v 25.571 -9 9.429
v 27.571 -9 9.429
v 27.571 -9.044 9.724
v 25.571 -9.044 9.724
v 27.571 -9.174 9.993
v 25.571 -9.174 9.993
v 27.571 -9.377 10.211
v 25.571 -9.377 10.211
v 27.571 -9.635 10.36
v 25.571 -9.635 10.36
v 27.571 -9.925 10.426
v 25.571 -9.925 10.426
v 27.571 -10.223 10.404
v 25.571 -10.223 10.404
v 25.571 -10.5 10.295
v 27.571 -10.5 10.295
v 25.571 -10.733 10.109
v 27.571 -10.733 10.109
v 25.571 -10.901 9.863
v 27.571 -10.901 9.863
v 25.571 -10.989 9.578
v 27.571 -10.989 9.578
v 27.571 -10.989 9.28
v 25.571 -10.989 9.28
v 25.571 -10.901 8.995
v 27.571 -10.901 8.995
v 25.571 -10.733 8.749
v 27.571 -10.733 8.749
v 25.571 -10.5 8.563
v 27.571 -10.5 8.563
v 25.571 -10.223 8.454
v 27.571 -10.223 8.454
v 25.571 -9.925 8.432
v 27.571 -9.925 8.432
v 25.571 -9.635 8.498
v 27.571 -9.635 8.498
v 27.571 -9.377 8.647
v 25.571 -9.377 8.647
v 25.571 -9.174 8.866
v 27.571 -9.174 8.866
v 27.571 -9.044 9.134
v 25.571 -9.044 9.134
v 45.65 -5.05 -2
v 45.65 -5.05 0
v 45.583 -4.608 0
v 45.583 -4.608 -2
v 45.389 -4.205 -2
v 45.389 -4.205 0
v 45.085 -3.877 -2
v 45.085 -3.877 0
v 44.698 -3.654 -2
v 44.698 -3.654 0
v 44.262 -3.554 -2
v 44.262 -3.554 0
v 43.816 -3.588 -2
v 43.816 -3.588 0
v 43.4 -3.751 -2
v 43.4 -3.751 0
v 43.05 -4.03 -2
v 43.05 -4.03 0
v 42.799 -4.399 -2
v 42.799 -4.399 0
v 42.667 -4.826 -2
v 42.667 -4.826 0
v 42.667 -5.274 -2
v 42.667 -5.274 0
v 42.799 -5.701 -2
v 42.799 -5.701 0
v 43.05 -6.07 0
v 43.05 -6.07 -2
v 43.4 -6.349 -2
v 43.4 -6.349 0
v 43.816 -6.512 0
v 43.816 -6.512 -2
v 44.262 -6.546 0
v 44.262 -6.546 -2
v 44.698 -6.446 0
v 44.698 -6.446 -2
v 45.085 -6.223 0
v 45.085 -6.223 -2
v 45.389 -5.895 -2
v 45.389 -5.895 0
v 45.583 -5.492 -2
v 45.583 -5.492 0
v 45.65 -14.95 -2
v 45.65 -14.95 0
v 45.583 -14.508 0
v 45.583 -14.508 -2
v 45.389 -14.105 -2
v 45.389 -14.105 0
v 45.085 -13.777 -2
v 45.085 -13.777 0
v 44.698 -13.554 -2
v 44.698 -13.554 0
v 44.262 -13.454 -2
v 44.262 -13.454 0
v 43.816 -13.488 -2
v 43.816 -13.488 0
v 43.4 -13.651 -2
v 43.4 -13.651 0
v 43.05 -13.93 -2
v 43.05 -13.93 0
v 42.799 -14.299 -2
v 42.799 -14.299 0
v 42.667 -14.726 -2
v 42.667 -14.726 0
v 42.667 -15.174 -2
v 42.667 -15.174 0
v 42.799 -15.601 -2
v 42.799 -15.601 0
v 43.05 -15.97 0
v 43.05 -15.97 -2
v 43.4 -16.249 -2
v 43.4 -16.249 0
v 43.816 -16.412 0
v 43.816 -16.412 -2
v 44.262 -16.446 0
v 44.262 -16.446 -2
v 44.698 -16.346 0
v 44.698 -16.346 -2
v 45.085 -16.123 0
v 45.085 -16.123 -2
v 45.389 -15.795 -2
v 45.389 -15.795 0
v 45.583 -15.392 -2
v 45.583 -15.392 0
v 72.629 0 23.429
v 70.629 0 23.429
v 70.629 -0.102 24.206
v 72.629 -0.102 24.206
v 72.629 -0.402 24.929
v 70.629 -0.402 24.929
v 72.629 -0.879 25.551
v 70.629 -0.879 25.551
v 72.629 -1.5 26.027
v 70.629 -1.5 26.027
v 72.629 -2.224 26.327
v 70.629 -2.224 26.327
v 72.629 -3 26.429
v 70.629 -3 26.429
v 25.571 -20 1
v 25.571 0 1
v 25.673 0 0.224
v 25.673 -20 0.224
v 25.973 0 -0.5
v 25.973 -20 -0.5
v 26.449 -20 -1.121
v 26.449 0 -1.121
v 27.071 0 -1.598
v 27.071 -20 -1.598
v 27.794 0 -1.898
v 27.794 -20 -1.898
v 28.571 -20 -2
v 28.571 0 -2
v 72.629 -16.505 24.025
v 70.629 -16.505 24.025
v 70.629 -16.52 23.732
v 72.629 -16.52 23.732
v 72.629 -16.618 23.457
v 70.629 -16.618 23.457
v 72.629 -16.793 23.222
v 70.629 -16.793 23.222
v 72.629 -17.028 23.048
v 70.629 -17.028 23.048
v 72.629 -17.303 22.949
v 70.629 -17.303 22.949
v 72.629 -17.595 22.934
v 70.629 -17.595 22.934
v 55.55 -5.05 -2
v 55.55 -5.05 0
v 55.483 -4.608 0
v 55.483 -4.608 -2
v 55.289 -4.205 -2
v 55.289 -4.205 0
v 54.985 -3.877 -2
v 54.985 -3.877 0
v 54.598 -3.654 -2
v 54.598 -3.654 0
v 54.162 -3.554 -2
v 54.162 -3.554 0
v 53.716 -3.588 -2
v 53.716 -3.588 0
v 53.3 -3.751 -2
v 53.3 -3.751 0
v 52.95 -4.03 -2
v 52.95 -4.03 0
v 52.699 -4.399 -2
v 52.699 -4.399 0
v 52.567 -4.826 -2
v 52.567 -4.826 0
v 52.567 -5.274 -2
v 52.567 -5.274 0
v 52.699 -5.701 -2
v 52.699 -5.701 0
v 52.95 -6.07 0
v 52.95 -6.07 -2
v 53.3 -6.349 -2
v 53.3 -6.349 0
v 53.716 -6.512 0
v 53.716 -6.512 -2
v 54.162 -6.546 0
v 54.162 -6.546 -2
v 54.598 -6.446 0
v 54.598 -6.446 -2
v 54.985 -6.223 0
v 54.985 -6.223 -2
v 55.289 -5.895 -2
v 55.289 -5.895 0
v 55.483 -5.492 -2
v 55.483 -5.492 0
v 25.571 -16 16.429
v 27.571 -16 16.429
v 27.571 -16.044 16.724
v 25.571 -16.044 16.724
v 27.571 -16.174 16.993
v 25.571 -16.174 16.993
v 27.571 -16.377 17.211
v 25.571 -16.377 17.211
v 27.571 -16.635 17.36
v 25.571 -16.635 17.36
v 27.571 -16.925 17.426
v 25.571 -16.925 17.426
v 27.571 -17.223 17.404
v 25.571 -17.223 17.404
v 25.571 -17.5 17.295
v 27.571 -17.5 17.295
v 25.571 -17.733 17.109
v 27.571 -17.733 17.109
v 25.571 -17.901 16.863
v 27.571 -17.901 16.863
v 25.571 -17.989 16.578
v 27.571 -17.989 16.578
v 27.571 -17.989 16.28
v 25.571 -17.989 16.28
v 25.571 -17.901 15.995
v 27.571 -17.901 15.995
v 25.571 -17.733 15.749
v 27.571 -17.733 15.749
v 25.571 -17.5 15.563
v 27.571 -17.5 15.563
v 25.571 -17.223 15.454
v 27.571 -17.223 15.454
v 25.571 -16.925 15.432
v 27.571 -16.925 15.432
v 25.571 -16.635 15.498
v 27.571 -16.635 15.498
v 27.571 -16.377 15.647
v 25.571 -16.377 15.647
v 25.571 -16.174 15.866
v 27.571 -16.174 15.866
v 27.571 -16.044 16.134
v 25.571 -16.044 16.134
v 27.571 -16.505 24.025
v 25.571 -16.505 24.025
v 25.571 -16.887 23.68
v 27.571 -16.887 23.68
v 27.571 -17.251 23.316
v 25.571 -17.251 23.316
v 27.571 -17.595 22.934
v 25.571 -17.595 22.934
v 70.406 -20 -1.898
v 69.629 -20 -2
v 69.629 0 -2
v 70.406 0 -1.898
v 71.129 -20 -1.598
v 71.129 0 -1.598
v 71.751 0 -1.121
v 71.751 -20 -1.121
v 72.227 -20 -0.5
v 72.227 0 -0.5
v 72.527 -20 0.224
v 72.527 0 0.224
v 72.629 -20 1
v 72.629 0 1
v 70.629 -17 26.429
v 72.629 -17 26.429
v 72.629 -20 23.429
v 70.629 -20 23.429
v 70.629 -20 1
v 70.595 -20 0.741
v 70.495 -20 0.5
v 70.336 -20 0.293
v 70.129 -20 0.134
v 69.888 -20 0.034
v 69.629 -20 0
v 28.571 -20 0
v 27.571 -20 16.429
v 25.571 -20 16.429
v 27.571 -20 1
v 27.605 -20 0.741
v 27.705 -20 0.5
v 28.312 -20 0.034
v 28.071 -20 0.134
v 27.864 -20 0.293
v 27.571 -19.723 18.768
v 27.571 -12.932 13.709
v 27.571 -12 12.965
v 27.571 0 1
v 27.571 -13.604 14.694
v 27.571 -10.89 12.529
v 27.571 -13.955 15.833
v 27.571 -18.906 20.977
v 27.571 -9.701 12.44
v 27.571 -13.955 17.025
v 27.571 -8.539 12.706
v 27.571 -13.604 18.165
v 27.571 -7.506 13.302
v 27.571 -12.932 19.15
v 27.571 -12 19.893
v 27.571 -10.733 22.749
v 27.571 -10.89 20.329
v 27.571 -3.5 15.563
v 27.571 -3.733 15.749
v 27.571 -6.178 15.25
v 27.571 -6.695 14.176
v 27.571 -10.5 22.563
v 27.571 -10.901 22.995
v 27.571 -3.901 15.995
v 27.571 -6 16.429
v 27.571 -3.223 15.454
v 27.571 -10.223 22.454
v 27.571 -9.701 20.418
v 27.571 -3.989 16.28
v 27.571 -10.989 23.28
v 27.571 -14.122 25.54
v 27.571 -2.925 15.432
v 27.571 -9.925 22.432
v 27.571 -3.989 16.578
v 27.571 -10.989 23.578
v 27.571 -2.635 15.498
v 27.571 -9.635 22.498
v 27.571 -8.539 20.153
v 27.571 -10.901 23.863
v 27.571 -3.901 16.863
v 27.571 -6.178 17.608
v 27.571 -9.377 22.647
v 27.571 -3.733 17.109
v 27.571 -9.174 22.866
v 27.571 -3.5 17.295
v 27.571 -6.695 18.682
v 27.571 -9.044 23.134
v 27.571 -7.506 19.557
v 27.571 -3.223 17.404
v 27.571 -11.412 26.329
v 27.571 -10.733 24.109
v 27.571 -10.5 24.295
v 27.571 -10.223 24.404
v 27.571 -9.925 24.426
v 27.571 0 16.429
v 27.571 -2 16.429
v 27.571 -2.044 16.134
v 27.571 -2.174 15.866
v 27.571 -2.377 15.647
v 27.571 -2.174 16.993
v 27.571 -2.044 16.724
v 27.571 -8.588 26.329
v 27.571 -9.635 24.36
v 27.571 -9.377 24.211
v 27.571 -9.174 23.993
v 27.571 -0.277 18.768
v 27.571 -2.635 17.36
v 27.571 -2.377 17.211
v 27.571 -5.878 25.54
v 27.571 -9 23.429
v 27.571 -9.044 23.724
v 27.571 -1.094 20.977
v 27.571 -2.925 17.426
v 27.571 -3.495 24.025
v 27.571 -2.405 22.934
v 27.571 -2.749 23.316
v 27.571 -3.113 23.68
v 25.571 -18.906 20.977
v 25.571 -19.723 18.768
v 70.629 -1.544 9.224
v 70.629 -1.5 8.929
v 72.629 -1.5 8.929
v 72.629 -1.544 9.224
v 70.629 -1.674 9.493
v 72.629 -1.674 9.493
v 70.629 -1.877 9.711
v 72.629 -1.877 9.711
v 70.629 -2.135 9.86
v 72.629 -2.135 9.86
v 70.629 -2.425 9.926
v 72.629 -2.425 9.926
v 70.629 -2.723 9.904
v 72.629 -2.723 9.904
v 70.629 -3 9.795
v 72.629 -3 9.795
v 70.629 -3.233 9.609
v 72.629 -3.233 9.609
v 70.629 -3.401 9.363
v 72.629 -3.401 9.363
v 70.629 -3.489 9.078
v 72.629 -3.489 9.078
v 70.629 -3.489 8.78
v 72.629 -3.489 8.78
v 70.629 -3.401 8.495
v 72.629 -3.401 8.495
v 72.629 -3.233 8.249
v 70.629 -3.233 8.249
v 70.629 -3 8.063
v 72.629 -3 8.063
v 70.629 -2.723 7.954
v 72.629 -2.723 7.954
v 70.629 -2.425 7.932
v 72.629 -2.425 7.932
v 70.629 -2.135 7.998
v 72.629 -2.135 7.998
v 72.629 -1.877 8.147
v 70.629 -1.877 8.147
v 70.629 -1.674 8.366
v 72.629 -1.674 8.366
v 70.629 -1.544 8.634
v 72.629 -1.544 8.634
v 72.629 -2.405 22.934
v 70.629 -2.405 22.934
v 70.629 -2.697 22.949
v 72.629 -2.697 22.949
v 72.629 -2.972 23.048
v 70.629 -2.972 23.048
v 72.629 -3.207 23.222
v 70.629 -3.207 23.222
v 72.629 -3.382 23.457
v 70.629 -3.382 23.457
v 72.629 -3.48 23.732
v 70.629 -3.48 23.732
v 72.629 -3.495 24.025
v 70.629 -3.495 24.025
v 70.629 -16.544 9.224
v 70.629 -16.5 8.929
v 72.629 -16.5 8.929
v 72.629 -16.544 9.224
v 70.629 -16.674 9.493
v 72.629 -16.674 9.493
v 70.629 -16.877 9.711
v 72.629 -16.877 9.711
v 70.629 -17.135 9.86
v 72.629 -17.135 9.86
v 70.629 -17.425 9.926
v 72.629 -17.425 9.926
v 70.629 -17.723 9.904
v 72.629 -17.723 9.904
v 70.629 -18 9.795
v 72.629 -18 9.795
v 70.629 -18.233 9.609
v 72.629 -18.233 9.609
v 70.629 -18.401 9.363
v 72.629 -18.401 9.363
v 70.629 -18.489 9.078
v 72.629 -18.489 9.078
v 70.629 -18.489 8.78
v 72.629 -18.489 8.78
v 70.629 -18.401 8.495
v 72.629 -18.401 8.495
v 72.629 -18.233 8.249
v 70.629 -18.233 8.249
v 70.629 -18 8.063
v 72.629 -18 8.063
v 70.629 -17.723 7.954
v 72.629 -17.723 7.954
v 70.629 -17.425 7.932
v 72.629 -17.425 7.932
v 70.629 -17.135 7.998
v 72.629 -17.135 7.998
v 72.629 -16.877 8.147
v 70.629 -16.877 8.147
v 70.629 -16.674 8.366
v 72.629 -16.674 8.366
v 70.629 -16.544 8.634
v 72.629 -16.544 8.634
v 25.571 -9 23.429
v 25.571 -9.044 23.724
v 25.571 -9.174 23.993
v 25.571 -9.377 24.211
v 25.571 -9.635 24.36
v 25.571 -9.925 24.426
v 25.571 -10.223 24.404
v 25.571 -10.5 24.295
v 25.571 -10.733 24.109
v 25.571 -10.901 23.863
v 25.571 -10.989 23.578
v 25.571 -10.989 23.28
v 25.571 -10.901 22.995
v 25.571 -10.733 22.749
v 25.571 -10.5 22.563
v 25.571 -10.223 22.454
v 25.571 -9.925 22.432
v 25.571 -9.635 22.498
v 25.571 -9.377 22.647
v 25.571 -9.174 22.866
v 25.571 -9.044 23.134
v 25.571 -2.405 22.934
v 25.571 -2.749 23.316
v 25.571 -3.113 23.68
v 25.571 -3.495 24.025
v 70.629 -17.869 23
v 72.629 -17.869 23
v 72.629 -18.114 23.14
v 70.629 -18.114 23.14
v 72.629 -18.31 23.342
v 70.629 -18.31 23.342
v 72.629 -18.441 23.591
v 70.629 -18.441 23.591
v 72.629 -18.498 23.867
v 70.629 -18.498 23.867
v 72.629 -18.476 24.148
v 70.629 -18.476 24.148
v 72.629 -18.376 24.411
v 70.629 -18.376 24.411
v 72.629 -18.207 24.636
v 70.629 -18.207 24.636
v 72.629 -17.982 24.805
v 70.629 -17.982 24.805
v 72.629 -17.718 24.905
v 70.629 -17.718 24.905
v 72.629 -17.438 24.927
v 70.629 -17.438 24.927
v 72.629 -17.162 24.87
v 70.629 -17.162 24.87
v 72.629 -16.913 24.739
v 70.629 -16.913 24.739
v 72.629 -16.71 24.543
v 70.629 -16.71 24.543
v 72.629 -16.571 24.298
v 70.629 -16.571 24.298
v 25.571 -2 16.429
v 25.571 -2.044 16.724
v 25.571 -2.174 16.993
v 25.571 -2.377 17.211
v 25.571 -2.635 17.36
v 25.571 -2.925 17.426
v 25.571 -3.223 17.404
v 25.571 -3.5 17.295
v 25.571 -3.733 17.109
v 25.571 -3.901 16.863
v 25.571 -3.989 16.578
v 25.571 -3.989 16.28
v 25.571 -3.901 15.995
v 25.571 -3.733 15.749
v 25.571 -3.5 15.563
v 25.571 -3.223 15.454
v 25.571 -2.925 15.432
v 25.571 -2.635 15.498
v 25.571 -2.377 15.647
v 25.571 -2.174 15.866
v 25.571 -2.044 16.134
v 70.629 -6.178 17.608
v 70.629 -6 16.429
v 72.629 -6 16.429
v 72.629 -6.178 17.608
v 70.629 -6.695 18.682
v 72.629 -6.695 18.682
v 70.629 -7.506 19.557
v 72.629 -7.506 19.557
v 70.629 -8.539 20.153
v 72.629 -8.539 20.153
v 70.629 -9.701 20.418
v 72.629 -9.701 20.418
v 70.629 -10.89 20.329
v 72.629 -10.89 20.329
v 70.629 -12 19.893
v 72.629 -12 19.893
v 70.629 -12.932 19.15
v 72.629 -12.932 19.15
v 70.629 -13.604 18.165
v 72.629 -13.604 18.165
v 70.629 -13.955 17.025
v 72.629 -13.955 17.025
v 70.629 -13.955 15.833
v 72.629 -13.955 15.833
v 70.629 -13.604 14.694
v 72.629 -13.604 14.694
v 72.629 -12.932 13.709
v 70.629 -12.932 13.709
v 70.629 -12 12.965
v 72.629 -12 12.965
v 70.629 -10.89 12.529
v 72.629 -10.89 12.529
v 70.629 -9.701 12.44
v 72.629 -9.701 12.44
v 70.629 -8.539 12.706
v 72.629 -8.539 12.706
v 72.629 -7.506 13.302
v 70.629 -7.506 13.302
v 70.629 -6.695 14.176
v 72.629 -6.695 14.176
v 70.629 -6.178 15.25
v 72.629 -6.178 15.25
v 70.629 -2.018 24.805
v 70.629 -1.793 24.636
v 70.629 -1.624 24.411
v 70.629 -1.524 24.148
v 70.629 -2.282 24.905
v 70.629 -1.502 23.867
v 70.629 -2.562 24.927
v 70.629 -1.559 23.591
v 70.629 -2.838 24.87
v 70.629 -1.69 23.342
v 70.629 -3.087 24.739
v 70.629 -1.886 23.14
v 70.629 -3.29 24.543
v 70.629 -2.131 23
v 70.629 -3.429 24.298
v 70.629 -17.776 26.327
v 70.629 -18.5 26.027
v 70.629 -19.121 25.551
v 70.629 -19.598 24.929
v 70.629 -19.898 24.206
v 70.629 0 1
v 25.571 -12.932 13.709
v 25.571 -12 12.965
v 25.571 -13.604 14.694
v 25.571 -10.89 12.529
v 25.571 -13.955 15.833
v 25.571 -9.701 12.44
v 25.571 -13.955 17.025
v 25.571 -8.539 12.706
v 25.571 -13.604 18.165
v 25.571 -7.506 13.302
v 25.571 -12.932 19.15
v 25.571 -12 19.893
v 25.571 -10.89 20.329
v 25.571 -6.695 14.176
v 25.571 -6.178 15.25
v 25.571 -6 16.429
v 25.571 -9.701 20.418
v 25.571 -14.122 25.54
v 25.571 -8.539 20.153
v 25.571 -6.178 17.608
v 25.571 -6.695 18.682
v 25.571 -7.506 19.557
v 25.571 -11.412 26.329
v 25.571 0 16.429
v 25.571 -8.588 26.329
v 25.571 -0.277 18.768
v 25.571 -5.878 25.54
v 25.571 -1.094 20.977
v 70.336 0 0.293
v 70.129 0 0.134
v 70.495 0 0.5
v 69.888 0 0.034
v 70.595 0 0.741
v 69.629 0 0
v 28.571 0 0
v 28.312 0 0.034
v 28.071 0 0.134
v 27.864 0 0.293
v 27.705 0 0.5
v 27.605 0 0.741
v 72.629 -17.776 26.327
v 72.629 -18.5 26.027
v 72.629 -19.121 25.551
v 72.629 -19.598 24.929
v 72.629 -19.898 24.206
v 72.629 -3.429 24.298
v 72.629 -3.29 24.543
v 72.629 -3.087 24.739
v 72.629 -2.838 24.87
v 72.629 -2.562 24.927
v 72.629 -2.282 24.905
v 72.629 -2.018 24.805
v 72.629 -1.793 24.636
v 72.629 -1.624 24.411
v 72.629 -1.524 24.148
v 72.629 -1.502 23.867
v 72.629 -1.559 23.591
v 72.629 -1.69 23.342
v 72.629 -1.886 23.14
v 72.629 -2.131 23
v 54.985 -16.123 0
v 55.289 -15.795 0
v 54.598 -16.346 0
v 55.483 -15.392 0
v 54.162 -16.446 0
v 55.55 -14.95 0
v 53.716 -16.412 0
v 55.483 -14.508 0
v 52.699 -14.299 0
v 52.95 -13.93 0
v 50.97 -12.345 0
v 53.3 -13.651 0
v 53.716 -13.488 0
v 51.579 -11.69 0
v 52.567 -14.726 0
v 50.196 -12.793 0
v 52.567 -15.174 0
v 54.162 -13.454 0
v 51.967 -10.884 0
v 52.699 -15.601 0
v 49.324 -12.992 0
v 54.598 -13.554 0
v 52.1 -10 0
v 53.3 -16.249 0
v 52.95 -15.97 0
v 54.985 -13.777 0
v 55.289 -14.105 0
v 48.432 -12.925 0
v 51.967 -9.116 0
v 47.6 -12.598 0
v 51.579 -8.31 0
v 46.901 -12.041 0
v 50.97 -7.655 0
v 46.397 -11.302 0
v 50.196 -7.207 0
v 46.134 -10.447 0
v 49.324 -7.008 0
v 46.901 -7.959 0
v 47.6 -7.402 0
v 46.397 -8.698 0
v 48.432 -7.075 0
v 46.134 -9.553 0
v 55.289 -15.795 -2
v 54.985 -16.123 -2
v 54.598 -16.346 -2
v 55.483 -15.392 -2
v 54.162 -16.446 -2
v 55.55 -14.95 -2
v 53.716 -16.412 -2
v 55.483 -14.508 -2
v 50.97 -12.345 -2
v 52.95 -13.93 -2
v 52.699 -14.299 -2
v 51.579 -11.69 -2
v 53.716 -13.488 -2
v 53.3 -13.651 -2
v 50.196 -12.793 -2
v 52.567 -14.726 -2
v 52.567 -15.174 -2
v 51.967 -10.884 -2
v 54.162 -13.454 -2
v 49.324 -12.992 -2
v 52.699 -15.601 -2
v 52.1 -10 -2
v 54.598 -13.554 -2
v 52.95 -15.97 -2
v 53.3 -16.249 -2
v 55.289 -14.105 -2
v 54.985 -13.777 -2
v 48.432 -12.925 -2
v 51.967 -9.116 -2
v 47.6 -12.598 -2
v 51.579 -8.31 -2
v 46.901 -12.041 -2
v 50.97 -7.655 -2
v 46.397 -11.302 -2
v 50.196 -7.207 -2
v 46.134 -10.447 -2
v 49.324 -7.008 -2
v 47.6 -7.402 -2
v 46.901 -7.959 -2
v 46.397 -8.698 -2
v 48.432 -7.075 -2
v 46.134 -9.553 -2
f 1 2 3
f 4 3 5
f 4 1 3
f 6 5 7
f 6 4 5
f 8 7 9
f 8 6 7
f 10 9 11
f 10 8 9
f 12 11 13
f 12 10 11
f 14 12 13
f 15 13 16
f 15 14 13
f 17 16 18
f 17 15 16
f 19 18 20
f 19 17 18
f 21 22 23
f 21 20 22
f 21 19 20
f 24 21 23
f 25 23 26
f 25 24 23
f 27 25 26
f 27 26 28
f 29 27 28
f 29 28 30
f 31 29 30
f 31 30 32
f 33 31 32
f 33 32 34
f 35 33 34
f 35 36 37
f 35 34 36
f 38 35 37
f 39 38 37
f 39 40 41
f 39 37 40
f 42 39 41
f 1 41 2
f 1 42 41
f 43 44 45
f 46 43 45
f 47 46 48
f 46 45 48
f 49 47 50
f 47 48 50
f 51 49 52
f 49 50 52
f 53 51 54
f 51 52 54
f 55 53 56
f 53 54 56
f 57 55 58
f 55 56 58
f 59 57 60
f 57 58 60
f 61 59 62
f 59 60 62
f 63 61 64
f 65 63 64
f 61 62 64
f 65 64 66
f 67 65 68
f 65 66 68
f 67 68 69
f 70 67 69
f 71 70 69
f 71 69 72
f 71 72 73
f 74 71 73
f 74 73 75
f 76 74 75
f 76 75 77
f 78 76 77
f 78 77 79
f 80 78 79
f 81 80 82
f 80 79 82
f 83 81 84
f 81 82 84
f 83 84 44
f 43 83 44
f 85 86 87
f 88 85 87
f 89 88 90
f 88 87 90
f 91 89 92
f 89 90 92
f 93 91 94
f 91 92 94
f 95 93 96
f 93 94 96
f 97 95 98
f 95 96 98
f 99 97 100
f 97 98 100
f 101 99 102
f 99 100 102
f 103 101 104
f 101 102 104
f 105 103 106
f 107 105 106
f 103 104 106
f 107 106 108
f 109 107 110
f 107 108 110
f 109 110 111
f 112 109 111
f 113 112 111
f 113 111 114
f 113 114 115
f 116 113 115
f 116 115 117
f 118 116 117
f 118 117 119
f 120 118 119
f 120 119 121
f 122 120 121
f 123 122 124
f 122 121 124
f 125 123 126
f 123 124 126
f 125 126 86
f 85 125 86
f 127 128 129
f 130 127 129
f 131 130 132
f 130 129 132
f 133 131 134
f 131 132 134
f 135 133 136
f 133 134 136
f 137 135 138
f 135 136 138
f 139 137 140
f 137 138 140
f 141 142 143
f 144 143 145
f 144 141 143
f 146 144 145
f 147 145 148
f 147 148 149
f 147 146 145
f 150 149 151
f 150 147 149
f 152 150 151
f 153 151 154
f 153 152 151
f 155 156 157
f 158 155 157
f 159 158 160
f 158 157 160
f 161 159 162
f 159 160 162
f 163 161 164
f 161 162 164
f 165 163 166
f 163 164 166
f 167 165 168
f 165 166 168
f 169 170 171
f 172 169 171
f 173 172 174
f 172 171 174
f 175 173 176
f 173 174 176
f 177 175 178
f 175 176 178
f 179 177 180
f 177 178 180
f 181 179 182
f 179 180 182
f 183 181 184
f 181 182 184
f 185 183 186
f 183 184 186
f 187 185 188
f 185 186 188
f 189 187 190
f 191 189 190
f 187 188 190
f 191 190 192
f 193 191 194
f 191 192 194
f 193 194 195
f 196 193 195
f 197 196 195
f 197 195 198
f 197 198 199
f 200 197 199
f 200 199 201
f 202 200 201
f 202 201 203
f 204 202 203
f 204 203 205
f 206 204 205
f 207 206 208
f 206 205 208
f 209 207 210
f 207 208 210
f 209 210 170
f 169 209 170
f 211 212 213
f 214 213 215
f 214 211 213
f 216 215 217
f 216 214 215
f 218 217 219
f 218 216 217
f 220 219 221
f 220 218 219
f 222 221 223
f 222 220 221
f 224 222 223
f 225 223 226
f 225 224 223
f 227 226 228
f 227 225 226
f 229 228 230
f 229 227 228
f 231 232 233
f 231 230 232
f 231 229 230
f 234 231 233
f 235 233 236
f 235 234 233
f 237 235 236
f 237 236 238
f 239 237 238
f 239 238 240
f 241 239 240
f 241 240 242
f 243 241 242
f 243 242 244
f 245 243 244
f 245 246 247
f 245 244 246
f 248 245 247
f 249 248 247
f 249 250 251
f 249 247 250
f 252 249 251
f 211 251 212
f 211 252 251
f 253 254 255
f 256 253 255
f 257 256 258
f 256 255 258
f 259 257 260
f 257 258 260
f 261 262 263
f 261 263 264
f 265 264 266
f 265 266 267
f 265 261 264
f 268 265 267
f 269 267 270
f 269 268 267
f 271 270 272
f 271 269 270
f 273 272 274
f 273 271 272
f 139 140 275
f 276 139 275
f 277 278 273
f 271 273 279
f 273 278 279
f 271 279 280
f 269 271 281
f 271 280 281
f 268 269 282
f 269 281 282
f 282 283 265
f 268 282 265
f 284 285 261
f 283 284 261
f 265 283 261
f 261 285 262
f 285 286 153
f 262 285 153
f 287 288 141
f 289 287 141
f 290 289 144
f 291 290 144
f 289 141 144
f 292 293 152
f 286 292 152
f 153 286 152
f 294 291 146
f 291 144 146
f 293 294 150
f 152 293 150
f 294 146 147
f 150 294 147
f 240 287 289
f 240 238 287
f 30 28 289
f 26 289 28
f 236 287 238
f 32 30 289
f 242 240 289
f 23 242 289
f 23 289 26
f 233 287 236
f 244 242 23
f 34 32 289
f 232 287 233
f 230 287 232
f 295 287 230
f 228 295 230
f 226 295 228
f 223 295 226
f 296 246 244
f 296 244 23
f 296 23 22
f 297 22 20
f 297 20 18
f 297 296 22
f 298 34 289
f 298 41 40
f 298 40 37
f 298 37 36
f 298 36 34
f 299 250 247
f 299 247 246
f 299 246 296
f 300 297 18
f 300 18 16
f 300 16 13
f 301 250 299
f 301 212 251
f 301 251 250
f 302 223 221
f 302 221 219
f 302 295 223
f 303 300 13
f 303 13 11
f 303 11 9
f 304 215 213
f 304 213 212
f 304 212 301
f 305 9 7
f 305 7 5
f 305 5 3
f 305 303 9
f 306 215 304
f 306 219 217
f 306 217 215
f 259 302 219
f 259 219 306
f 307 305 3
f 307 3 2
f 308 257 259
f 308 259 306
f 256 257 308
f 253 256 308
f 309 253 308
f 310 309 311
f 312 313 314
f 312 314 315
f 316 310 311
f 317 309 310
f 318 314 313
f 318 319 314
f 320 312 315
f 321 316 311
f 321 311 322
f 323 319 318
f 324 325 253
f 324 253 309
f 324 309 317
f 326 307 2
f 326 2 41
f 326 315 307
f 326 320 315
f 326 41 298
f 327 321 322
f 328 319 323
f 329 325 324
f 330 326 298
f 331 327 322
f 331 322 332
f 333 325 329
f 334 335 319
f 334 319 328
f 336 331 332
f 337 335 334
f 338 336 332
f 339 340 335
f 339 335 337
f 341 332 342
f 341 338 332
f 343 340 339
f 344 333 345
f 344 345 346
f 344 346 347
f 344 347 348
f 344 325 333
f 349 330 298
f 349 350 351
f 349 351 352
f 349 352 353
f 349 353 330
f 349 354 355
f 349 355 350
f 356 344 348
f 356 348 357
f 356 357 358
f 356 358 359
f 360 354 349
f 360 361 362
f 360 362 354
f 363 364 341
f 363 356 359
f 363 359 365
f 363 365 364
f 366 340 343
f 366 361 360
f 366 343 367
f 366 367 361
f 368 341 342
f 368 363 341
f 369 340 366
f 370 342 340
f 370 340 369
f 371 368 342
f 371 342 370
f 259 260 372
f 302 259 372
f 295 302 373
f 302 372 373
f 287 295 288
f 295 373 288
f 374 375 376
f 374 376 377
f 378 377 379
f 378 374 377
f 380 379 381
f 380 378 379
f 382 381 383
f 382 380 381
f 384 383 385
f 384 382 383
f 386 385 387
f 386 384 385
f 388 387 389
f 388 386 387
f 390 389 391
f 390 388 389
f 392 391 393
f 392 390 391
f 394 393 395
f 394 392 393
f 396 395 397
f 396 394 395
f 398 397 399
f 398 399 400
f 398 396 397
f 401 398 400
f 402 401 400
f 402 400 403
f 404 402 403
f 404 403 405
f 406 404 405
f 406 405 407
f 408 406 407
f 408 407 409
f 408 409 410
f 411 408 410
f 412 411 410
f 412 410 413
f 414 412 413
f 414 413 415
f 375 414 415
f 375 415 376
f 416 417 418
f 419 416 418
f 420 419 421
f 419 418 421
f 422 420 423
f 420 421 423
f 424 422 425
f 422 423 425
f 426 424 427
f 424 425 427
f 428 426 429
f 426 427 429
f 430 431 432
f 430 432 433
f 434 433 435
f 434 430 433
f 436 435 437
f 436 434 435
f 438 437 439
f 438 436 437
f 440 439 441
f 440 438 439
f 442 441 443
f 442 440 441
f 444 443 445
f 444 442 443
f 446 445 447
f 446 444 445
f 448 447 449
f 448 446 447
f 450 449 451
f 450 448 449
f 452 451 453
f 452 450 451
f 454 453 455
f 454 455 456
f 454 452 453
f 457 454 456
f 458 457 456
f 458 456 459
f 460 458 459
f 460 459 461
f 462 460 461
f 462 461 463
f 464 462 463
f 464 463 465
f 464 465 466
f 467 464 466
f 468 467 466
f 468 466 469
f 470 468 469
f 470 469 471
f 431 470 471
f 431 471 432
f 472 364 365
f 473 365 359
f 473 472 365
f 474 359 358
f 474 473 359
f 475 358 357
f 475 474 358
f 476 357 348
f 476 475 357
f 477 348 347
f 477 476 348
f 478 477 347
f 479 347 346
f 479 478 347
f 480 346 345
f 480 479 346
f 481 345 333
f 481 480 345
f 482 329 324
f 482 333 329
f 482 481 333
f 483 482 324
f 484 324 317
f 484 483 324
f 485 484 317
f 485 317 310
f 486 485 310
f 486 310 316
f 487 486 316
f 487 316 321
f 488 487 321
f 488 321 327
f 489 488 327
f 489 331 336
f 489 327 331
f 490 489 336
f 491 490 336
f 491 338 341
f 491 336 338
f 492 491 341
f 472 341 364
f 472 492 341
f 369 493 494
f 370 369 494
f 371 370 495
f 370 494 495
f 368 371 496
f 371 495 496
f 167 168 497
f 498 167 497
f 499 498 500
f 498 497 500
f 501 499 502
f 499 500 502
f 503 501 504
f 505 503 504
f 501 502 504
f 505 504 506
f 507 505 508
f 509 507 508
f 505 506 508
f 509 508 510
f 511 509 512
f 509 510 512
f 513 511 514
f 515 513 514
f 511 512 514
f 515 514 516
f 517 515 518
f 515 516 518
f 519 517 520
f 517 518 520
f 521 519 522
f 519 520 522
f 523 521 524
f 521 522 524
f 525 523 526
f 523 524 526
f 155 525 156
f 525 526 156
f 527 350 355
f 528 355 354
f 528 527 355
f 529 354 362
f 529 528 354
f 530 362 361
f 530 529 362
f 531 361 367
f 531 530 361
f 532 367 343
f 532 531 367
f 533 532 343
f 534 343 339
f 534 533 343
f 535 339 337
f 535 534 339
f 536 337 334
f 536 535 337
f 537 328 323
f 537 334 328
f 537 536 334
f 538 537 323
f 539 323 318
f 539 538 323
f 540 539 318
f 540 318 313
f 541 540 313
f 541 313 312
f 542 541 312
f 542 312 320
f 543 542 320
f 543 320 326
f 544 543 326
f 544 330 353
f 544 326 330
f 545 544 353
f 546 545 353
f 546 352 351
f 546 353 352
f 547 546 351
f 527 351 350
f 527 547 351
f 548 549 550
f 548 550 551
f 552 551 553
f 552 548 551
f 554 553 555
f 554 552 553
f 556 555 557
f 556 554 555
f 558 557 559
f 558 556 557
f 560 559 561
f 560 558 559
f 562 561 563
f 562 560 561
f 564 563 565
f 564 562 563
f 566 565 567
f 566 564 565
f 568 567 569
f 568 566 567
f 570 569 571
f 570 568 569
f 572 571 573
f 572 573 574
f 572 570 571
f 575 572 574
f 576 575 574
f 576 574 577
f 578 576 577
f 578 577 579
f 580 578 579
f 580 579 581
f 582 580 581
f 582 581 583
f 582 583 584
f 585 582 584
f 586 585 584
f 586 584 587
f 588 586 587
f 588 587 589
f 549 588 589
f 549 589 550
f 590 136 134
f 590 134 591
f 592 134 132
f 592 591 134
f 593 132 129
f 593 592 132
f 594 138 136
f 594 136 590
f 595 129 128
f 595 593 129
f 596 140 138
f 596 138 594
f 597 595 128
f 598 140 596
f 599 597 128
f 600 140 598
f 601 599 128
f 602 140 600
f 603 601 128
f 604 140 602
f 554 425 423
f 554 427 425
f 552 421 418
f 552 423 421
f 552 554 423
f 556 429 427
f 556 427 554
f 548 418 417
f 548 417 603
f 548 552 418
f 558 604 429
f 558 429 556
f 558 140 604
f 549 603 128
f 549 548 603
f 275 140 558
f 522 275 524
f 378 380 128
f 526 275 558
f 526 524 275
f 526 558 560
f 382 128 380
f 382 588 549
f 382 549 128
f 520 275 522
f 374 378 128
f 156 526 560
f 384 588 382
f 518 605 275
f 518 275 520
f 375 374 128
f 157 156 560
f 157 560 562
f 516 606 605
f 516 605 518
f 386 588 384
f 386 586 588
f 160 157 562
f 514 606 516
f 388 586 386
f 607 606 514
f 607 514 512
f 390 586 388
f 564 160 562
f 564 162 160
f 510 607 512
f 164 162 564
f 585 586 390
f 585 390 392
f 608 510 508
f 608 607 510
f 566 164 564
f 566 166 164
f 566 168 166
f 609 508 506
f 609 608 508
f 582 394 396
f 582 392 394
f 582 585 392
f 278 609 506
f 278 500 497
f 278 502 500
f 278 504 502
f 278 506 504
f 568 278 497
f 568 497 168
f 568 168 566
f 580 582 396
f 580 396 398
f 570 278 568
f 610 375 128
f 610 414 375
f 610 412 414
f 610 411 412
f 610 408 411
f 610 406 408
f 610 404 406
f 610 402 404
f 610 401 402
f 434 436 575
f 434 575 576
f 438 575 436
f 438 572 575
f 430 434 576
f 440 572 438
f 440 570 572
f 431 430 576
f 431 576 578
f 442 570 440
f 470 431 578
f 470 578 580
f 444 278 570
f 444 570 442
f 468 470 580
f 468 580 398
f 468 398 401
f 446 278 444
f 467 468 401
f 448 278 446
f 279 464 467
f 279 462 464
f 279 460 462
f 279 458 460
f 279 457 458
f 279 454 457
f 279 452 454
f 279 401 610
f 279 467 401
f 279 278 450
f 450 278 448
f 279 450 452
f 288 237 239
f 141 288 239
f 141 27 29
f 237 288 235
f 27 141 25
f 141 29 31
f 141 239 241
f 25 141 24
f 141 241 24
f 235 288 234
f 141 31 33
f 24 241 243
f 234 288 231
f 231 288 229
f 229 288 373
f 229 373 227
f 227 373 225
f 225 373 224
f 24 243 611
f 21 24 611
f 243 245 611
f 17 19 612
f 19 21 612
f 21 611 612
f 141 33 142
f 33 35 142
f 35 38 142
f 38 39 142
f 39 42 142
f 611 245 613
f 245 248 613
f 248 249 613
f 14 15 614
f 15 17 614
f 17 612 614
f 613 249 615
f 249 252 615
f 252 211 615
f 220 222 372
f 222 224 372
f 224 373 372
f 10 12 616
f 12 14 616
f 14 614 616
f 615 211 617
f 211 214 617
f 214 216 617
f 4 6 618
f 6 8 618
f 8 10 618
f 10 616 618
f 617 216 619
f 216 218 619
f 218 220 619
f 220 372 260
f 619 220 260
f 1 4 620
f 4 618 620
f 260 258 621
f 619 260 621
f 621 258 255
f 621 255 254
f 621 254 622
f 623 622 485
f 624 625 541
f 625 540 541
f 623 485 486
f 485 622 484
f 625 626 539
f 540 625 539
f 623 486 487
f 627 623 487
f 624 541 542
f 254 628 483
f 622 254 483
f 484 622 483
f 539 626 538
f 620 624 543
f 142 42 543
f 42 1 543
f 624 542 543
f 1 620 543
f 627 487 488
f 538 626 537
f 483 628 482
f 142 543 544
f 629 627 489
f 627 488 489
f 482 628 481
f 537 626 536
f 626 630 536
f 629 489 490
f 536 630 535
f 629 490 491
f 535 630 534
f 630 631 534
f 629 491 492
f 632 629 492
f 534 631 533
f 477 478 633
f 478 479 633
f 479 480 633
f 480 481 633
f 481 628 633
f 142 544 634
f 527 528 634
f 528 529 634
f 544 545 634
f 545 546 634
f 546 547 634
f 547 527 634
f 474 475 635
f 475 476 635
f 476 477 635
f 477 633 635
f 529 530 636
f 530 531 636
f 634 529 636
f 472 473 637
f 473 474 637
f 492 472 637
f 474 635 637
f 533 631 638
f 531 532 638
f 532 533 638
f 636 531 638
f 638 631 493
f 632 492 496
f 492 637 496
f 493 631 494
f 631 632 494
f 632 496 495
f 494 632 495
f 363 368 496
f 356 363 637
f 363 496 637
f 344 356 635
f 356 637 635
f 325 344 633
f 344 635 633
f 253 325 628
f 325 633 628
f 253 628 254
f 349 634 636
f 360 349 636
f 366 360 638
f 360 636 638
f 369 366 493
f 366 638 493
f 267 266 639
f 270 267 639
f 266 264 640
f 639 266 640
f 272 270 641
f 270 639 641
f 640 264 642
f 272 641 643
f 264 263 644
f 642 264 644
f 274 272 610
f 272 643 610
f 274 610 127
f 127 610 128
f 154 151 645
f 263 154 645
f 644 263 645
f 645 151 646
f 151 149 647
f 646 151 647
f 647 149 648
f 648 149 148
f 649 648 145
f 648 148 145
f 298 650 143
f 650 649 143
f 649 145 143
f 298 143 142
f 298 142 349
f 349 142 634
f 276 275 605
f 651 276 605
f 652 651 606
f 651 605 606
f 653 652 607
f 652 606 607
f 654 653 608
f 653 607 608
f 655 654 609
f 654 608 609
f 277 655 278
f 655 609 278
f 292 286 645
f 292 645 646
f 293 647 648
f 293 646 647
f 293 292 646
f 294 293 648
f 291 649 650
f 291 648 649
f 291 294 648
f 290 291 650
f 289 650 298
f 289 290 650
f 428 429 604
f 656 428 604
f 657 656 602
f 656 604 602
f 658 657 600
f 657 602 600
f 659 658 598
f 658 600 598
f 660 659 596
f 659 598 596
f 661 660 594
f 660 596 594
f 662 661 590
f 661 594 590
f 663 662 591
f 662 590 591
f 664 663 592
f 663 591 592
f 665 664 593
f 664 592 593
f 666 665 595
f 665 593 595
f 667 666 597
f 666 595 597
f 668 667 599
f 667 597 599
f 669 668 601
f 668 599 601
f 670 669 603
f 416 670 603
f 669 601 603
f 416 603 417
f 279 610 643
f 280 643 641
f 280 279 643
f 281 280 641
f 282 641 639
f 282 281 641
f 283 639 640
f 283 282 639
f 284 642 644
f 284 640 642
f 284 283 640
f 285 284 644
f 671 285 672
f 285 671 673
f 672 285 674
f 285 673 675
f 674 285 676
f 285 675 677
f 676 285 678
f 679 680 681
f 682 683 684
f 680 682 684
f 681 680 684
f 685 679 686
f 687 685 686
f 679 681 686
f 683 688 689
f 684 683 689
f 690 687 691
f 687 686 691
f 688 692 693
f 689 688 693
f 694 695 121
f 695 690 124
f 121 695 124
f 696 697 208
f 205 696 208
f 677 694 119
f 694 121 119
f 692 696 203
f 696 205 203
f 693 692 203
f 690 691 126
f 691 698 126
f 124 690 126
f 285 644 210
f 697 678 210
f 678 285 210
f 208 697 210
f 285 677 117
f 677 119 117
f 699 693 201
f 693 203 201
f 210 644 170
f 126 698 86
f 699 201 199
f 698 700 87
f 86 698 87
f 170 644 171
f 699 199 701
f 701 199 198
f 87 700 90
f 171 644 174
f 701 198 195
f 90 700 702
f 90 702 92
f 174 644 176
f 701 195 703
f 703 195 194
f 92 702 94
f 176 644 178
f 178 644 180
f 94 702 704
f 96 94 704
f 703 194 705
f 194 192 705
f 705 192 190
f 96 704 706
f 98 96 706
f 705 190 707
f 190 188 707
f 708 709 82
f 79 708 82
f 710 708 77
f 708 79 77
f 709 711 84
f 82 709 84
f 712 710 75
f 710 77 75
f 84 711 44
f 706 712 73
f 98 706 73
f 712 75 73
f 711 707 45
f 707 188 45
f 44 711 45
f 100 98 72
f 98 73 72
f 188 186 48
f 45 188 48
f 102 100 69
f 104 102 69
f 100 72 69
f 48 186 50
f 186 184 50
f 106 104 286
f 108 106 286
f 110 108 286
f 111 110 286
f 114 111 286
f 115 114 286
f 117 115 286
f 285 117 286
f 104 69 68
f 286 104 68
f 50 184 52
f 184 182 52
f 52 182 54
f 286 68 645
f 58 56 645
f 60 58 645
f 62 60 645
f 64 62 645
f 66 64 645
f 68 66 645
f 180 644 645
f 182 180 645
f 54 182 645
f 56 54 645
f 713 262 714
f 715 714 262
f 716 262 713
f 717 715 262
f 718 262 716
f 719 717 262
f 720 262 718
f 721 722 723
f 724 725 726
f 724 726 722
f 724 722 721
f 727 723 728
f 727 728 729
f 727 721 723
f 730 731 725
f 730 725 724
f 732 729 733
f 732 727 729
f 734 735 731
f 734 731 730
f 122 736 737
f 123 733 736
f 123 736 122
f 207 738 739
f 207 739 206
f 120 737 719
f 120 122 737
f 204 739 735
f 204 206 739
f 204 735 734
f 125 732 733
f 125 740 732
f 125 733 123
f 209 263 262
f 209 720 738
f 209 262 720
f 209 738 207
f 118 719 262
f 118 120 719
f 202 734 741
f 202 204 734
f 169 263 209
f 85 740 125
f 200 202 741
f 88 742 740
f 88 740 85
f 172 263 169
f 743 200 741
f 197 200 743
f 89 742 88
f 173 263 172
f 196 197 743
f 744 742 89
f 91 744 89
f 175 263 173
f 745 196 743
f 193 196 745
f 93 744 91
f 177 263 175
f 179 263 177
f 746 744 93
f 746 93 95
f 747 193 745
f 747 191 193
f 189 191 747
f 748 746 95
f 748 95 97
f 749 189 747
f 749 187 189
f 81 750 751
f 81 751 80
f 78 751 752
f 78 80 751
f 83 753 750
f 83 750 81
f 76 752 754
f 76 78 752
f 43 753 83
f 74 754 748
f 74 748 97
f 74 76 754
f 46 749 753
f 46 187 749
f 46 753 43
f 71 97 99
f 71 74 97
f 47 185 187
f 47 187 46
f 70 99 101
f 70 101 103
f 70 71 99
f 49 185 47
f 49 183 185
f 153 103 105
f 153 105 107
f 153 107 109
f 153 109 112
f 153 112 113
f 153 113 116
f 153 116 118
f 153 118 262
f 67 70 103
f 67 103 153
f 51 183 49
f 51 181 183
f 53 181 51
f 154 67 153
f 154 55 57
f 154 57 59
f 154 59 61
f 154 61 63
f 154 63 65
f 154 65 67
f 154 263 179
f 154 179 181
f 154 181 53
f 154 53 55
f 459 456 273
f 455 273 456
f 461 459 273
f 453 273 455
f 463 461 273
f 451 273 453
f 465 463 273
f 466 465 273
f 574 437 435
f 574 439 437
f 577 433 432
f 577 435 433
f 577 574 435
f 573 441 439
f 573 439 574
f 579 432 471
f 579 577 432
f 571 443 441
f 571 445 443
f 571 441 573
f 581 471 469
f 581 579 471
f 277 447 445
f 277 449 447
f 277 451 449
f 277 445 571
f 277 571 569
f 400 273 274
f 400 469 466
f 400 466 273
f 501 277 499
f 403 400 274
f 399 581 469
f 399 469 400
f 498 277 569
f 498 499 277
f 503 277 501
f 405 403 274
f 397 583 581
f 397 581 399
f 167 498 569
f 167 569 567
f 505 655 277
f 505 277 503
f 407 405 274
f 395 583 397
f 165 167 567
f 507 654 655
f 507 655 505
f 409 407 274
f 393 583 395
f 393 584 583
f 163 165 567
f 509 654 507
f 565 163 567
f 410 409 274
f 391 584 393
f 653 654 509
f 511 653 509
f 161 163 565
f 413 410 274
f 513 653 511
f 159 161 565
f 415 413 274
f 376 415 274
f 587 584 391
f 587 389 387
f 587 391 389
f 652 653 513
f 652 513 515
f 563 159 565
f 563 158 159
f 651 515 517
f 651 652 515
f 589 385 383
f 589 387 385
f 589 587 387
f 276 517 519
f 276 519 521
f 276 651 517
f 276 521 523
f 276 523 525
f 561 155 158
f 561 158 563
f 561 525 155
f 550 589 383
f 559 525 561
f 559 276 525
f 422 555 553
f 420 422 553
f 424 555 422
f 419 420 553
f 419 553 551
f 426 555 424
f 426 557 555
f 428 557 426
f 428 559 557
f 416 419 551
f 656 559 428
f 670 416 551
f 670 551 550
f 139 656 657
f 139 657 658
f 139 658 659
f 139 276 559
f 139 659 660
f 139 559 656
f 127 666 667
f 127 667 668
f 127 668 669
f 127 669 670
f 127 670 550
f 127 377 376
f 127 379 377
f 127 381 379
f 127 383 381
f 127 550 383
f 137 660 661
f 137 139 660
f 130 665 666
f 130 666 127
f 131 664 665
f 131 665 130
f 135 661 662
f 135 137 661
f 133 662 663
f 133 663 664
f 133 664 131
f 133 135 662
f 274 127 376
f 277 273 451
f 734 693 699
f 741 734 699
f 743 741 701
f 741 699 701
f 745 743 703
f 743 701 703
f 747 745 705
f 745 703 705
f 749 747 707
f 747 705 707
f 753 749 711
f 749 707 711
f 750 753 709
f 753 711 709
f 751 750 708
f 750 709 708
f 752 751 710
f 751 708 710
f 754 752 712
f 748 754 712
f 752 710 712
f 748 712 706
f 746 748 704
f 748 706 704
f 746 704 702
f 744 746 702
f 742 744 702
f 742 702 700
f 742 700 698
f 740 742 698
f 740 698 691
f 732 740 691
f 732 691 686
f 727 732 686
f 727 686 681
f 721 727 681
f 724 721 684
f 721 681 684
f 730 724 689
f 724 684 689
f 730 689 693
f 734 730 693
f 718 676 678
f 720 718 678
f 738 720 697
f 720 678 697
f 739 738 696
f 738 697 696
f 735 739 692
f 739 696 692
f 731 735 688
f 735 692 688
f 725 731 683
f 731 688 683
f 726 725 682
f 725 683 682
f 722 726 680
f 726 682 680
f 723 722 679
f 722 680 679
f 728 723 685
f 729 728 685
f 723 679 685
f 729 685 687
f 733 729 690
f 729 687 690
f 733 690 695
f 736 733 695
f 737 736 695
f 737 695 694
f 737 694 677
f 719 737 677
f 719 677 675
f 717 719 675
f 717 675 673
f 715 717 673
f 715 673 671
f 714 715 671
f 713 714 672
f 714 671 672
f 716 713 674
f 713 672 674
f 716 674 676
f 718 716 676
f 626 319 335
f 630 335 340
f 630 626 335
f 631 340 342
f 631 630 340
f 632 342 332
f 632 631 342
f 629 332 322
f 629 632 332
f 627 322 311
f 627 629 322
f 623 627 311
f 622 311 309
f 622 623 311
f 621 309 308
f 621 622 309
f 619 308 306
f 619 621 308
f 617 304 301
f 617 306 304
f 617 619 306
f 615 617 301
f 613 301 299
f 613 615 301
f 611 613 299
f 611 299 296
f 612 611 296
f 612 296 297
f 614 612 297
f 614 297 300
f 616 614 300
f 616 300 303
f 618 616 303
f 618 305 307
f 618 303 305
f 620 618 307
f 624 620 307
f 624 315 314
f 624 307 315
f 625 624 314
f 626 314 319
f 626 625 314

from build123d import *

# Parameters (mm, degrees)
IZIM1_R                      = 4
IZIM1_R_2                    = 1
IZIM1_R_3                    = 3
IZIM1_R_4                    = 1.5
TABAN_FLAN_2_DEPTH           = 2
IZGIDEN_START                = -1
IZGIDEN_B_KME2_OUTLINE_W     = 20
IZGIDEN_B_KME2_OUTLINE_H     = 2
IZGIDEN_B_KME2_DEPTH         = 26.570796327
IZGIDEN_START_2              = 72.629203673
IZGIDEN_B_KME2_2_OUTLINE_W   = 20
IZGIDEN_B_KME2_2_OUTLINE_H   = 2
IZGIDEN_B_KME2_2_DEPTH       = 25.570796327
IZGIDEN_START_3              = 25.570796327
IZGIDEN_B_KME2_3_OUTLINE_R   = 1
IZGIDEN_B_KME2_3_OUTLINE_R_2 = 4
IZGIDEN_B_KME2_3_DEPTH       = 3
IZGIDEN_START_4              = 69.629203673
IZGIDEN_B_KME2_4_OUTLINE_R   = 1
IZGIDEN_B_KME2_4_OUTLINE_R_2 = 4
IZGIDEN_B_KME2_4_DEPTH       = 3
IZGIDEN_START_5              = 70.629203673
IZGIDEN_B_KME2_5_OUTLINE_R   = 1
IZGIDEN_B_KME2_5_DEPTH       = 2
IZGIDEN_B_KME2_6_OUTLINE_R   = 1
IZGIDEN_B_KME2_6_DEPTH       = 2
IZGIDEN_START_6              = -21
IZGIDEN_B_KME2_7_DEPTH       = 22


with BuildPart() as part:
    # Taban-Flanş2: sheet metal written as solids
    # Çizim1 → Taban-Flanş2 (new body)
    with BuildSketch(Plane.XY):
        with BuildLine():
            Line((98.2, -3), (98.2, -17))
            ThreePointArc((98.2, -17), (97.321320344, -19.121320344), (95.2, -20))
            Line((95.2, -20), (10, -20))
            ThreePointArc((10, -20), (0, -10), (10, 0))
            Line((10, 0), (95.2, 0))
            ThreePointArc((95.2, 0), (97.321320344, -0.878679656), (98.2, -3))
        make_face()
        with Locations((10, -10)):
            Circle(IZIM1_R, mode=Mode.SUBTRACT)
        with Locations((10, -17)):
            Circle(IZIM1_R_2, mode=Mode.SUBTRACT)
        with Locations((3, -10)):
            Circle(IZIM1_R_2, mode=Mode.SUBTRACT)
        with Locations((10, -3)):
            Circle(IZIM1_R_2, mode=Mode.SUBTRACT)
        with Locations((17, -10)):
            Circle(IZIM1_R_2, mode=Mode.SUBTRACT)
        with Locations((88.2, -10)):
            Circle(IZIM1_R, mode=Mode.SUBTRACT)
        with Locations((80.7, -2.5)):
            Circle(IZIM1_R_2, mode=Mode.SUBTRACT)
        with Locations((95.7, -2.5)):
            Circle(IZIM1_R_2, mode=Mode.SUBTRACT)
        with Locations((95.7, -17.5)):
            Circle(IZIM1_R_2, mode=Mode.SUBTRACT)
        with Locations((80.7, -17.5)):
            Circle(IZIM1_R_2, mode=Mode.SUBTRACT)
        with Locations((49.1, -10)):
            Circle(IZIM1_R_3, mode=Mode.SUBTRACT)
        with Locations((54.05, -5.05)):
            Circle(IZIM1_R_4, mode=Mode.SUBTRACT)
        with Locations((44.15, -5.05)):
            Circle(IZIM1_R_4, mode=Mode.SUBTRACT)
        with Locations((44.15, -14.95)):
            Circle(IZIM1_R_4, mode=Mode.SUBTRACT)
        with Locations((54.05, -14.95)):
            Circle(IZIM1_R_4, mode=Mode.SUBTRACT)
    extrude(amount=-TABAN_FLAN_2_DEPTH)

    # Çizgiden Bükme2: read off the stored shape, not the designer's step
    # Çizgiden Bükme2 outline → Çizgiden Bükme2 (cut)
    with BuildSketch(Plane.YZ.offset(IZGIDEN_START)):
        with Locations((-10, -1)):
            Rectangle(IZGIDEN_B_KME2_OUTLINE_W, IZGIDEN_B_KME2_OUTLINE_H)
    extrude(amount=IZGIDEN_B_KME2_DEPTH, mode=Mode.SUBTRACT)

    # izgiden B_kme2 2 outline → izgiden B_kme2 2 (cut)
    with BuildSketch(Plane.YZ.offset(IZGIDEN_START_2)):
        with Locations((-10, -1)):
            Rectangle(IZGIDEN_B_KME2_2_OUTLINE_W, IZGIDEN_B_KME2_2_OUTLINE_H)
    extrude(amount=IZGIDEN_B_KME2_2_DEPTH, mode=Mode.SUBTRACT)

    # izgiden B_kme2 3 outline → izgiden B_kme2 3 (add)
    with BuildSketch(Plane.YZ.offset(IZGIDEN_START_3)):
        with BuildLine():
            Line((-20, 0), (0, 0))
            Line((0, 0), (0, 16.429203673))
            ThreePointArc((0, 16.429203673), (-0.620384974, 19.896597791), (-2.404564394, 22.933768067))
            ThreePointArc((-2.404564394, 22.933768067), (-3.207106781, 23.222096892), (-3.495435606, 24.024639279))
            ThreePointArc((-3.495435606, 24.024639279), (-10, 26.429203673), (-16.504564394, 24.024639279))
            ThreePointArc((-16.504564394, 24.024639279), (-16.792893219, 23.222096892), (-17.595435606, 22.933768067))
            ThreePointArc((-17.595435606, 22.933768067), (-19.379615026, 19.896597791), (-20, 16.429203673))
            Line((-20, 16.429203673), (-20, 0))
        make_face()
        with Locations((-17.5, 8.929203673)):
            Circle(IZGIDEN_B_KME2_3_OUTLINE_R, mode=Mode.SUBTRACT)
        with Locations((-10, 9.429203673)):
            Circle(IZGIDEN_B_KME2_3_OUTLINE_R, mode=Mode.SUBTRACT)
        with Locations((-2.5, 8.929203673)):
            Circle(IZGIDEN_B_KME2_3_OUTLINE_R, mode=Mode.SUBTRACT)
        with Locations((-17, 16.429203673)):
            Circle(IZGIDEN_B_KME2_3_OUTLINE_R, mode=Mode.SUBTRACT)
        with Locations((-10, 16.429203673)):
            Circle(IZGIDEN_B_KME2_3_OUTLINE_R_2, mode=Mode.SUBTRACT)
        with Locations((-3, 16.429203673)):
            Circle(IZGIDEN_B_KME2_3_OUTLINE_R, mode=Mode.SUBTRACT)
        with Locations((-10, 23.429203673)):
            Circle(IZGIDEN_B_KME2_3_OUTLINE_R, mode=Mode.SUBTRACT)
    extrude(amount=IZGIDEN_B_KME2_3_DEPTH)

    # izgiden B_kme2 4 outline → izgiden B_kme2 4 (add)
    with BuildSketch(Plane.YZ.offset(IZGIDEN_START_4)):
        with BuildLine():
            Line((-20, 0), (0, 0))
            Line((0, 0), (0, 16.429203673))
            ThreePointArc((0, 16.429203673), (-0.620384974, 19.896597791), (-2.404564394, 22.933768067))
            ThreePointArc((-2.404564394, 22.933768067), (-3.207106781, 23.222096892), (-3.495435606, 24.024639279))
            ThreePointArc((-3.495435606, 24.024639279), (-10, 26.429203673), (-16.504564394, 24.024639279))
            ThreePointArc((-16.504564394, 24.024639279), (-16.792893219, 23.222096892), (-17.595435606, 22.933768067))
            ThreePointArc((-17.595435606, 22.933768067), (-19.379615026, 19.896597791), (-20, 16.429203673))
            Line((-20, 16.429203673), (-20, 0))
        make_face()
        with Locations((-17.5, 8.929203673)):
            Circle(IZGIDEN_B_KME2_4_OUTLINE_R, mode=Mode.SUBTRACT)
        with Locations((-10, 9.429203673)):
            Circle(IZGIDEN_B_KME2_4_OUTLINE_R, mode=Mode.SUBTRACT)
        with Locations((-2.5, 8.929203673)):
            Circle(IZGIDEN_B_KME2_4_OUTLINE_R, mode=Mode.SUBTRACT)
        with Locations((-17, 16.429203673)):
            Circle(IZGIDEN_B_KME2_4_OUTLINE_R, mode=Mode.SUBTRACT)
        with Locations((-10, 16.429203673)):
            Circle(IZGIDEN_B_KME2_4_OUTLINE_R_2, mode=Mode.SUBTRACT)
        with Locations((-3, 16.429203673)):
            Circle(IZGIDEN_B_KME2_4_OUTLINE_R, mode=Mode.SUBTRACT)
        with Locations((-10, 23.429203673)):
            Circle(IZGIDEN_B_KME2_4_OUTLINE_R, mode=Mode.SUBTRACT)
    extrude(amount=IZGIDEN_B_KME2_4_DEPTH)

    # izgiden B_kme2 5 outline → izgiden B_kme2 5 (add)
    with BuildSketch(Plane.YZ.offset(IZGIDEN_START_5)):
        with BuildLine():
            ThreePointArc((-2.404564394, 22.933768067), (-0.620384974, 19.896597791), (0, 16.429203673))
            Line((0, 16.429203673), (0, 23.429203673))
            ThreePointArc((0, 23.429203673), (-0.878679656, 25.550524017), (-3, 26.429203673))
            Line((-3, 26.429203673), (-10, 26.429203673))
            ThreePointArc((-10, 26.429203673), (-6.532605882, 25.808818699), (-3.495435606, 24.024639279))
            ThreePointArc((-3.495435606, 24.024639279), (-1.792893219, 24.636310454), (-2.404564394, 22.933768067))
        make_face()
        with BuildLine():
            Line((-20, 23.429203673), (-20, 16.429203673))
            ThreePointArc((-20, 16.429203673), (-19.379615026, 19.896597791), (-17.595435606, 22.933768067))
            ThreePointArc((-17.595435606, 22.933768067), (-18.207106781, 24.636310454), (-16.504564394, 24.024639279))
            ThreePointArc((-16.504564394, 24.024639279), (-13.467394118, 25.808818699), (-10, 26.429203673))
            Line((-10, 26.429203673), (-17, 26.429203673))
            ThreePointArc((-17, 26.429203673), (-19.121320344, 25.550524017), (-20, 23.429203673))
        make_face()
        with Locations((-17, 16.429203673)):
            Circle(IZGIDEN_B_KME2_5_OUTLINE_R)
        with Locations((-10, 23.429203673)):
            Circle(IZGIDEN_B_KME2_5_OUTLINE_R)
        with Locations((-3, 16.429203673)):
            Circle(IZGIDEN_B_KME2_5_OUTLINE_R)
        with Locations((-10, 9.429203673)):
            Circle(IZGIDEN_B_KME2_5_OUTLINE_R)
    extrude(amount=IZGIDEN_B_KME2_5_DEPTH)

    # izgiden B_kme2 6 outline → izgiden B_kme2 6 (add)
    with BuildSketch(Plane.YZ.offset(IZGIDEN_START_3)):
        with BuildLine():
            ThreePointArc((-3.495435606, 24.024639279), (-3.207106781, 23.222096892), (-2.404564394, 22.933768067))
            ThreePointArc((-2.404564394, 22.933768067), (-2.928932188, 23.500271485), (-3.495435606, 24.024639279))
        make_face()
        with BuildLine():
            ThreePointArc((-16.504564394, 24.024639279), (-17.071067812, 23.500271485), (-17.595435606, 22.933768067))
            ThreePointArc((-17.595435606, 22.933768067), (-16.792893219, 23.222096892), (-16.504564394, 24.024639279))
        make_face()
        with Locations((-2.5, 8.929203673)):
            Circle(IZGIDEN_B_KME2_6_OUTLINE_R)
        with Locations((-17.5, 8.929203673)):
            Circle(IZGIDEN_B_KME2_6_OUTLINE_R)
    extrude(amount=IZGIDEN_B_KME2_6_DEPTH)

    # izgiden B_kme2 7 outline → izgiden B_kme2 7 (cut)
    with BuildSketch(Plane(origin=(0, 0, 0), x_dir=(1, 0, 0), z_dir=(0, 1, 0)).offset(IZGIDEN_START_6)):
        with BuildLine():
            ThreePointArc((25.570796327, -1), (26.449475983, 1.121320344), (28.570796327, 2))
            Line((28.570796327, 2), (25.570796327, 1.999999978))
            Line((25.570796327, 1.999999978), (25.570796327, -1))
        make_face()
        with BuildLine():
            Line((72.629203673, 1.999999978), (69.629203673, 2))
            ThreePointArc((69.629203673, 2), (71.750524017, 1.121320344), (72.629203673, -1))
            Line((72.629203673, -1), (72.629203673, 1.999999978))
        make_face()
        with BuildLine():
            Line((27.570796327, -1), (27.570796327, -28))
            Line((27.570796327, -28), (28.570796327, -28))
            Line((28.570796327, -28), (28.570796327, 0))
            ThreePointArc((28.570796327, 0), (27.863689546, -0.292893219), (27.570796327, -1))
        make_face()
        with BuildLine():
            Line((69.629203673, -28), (70.629203673, -28))
            Line((70.629203673, -28), (70.629203673, -1))
            ThreePointArc((70.629203673, -1), (70.336310454, -0.292893219), (69.629203673, 0))
            Line((69.629203673, 0), (69.629203673, -28))
        make_face()
    extrude(amount=IZGIDEN_B_KME2_7_DEPTH, mode=Mode.SUBTRACT)


solid = part.part
